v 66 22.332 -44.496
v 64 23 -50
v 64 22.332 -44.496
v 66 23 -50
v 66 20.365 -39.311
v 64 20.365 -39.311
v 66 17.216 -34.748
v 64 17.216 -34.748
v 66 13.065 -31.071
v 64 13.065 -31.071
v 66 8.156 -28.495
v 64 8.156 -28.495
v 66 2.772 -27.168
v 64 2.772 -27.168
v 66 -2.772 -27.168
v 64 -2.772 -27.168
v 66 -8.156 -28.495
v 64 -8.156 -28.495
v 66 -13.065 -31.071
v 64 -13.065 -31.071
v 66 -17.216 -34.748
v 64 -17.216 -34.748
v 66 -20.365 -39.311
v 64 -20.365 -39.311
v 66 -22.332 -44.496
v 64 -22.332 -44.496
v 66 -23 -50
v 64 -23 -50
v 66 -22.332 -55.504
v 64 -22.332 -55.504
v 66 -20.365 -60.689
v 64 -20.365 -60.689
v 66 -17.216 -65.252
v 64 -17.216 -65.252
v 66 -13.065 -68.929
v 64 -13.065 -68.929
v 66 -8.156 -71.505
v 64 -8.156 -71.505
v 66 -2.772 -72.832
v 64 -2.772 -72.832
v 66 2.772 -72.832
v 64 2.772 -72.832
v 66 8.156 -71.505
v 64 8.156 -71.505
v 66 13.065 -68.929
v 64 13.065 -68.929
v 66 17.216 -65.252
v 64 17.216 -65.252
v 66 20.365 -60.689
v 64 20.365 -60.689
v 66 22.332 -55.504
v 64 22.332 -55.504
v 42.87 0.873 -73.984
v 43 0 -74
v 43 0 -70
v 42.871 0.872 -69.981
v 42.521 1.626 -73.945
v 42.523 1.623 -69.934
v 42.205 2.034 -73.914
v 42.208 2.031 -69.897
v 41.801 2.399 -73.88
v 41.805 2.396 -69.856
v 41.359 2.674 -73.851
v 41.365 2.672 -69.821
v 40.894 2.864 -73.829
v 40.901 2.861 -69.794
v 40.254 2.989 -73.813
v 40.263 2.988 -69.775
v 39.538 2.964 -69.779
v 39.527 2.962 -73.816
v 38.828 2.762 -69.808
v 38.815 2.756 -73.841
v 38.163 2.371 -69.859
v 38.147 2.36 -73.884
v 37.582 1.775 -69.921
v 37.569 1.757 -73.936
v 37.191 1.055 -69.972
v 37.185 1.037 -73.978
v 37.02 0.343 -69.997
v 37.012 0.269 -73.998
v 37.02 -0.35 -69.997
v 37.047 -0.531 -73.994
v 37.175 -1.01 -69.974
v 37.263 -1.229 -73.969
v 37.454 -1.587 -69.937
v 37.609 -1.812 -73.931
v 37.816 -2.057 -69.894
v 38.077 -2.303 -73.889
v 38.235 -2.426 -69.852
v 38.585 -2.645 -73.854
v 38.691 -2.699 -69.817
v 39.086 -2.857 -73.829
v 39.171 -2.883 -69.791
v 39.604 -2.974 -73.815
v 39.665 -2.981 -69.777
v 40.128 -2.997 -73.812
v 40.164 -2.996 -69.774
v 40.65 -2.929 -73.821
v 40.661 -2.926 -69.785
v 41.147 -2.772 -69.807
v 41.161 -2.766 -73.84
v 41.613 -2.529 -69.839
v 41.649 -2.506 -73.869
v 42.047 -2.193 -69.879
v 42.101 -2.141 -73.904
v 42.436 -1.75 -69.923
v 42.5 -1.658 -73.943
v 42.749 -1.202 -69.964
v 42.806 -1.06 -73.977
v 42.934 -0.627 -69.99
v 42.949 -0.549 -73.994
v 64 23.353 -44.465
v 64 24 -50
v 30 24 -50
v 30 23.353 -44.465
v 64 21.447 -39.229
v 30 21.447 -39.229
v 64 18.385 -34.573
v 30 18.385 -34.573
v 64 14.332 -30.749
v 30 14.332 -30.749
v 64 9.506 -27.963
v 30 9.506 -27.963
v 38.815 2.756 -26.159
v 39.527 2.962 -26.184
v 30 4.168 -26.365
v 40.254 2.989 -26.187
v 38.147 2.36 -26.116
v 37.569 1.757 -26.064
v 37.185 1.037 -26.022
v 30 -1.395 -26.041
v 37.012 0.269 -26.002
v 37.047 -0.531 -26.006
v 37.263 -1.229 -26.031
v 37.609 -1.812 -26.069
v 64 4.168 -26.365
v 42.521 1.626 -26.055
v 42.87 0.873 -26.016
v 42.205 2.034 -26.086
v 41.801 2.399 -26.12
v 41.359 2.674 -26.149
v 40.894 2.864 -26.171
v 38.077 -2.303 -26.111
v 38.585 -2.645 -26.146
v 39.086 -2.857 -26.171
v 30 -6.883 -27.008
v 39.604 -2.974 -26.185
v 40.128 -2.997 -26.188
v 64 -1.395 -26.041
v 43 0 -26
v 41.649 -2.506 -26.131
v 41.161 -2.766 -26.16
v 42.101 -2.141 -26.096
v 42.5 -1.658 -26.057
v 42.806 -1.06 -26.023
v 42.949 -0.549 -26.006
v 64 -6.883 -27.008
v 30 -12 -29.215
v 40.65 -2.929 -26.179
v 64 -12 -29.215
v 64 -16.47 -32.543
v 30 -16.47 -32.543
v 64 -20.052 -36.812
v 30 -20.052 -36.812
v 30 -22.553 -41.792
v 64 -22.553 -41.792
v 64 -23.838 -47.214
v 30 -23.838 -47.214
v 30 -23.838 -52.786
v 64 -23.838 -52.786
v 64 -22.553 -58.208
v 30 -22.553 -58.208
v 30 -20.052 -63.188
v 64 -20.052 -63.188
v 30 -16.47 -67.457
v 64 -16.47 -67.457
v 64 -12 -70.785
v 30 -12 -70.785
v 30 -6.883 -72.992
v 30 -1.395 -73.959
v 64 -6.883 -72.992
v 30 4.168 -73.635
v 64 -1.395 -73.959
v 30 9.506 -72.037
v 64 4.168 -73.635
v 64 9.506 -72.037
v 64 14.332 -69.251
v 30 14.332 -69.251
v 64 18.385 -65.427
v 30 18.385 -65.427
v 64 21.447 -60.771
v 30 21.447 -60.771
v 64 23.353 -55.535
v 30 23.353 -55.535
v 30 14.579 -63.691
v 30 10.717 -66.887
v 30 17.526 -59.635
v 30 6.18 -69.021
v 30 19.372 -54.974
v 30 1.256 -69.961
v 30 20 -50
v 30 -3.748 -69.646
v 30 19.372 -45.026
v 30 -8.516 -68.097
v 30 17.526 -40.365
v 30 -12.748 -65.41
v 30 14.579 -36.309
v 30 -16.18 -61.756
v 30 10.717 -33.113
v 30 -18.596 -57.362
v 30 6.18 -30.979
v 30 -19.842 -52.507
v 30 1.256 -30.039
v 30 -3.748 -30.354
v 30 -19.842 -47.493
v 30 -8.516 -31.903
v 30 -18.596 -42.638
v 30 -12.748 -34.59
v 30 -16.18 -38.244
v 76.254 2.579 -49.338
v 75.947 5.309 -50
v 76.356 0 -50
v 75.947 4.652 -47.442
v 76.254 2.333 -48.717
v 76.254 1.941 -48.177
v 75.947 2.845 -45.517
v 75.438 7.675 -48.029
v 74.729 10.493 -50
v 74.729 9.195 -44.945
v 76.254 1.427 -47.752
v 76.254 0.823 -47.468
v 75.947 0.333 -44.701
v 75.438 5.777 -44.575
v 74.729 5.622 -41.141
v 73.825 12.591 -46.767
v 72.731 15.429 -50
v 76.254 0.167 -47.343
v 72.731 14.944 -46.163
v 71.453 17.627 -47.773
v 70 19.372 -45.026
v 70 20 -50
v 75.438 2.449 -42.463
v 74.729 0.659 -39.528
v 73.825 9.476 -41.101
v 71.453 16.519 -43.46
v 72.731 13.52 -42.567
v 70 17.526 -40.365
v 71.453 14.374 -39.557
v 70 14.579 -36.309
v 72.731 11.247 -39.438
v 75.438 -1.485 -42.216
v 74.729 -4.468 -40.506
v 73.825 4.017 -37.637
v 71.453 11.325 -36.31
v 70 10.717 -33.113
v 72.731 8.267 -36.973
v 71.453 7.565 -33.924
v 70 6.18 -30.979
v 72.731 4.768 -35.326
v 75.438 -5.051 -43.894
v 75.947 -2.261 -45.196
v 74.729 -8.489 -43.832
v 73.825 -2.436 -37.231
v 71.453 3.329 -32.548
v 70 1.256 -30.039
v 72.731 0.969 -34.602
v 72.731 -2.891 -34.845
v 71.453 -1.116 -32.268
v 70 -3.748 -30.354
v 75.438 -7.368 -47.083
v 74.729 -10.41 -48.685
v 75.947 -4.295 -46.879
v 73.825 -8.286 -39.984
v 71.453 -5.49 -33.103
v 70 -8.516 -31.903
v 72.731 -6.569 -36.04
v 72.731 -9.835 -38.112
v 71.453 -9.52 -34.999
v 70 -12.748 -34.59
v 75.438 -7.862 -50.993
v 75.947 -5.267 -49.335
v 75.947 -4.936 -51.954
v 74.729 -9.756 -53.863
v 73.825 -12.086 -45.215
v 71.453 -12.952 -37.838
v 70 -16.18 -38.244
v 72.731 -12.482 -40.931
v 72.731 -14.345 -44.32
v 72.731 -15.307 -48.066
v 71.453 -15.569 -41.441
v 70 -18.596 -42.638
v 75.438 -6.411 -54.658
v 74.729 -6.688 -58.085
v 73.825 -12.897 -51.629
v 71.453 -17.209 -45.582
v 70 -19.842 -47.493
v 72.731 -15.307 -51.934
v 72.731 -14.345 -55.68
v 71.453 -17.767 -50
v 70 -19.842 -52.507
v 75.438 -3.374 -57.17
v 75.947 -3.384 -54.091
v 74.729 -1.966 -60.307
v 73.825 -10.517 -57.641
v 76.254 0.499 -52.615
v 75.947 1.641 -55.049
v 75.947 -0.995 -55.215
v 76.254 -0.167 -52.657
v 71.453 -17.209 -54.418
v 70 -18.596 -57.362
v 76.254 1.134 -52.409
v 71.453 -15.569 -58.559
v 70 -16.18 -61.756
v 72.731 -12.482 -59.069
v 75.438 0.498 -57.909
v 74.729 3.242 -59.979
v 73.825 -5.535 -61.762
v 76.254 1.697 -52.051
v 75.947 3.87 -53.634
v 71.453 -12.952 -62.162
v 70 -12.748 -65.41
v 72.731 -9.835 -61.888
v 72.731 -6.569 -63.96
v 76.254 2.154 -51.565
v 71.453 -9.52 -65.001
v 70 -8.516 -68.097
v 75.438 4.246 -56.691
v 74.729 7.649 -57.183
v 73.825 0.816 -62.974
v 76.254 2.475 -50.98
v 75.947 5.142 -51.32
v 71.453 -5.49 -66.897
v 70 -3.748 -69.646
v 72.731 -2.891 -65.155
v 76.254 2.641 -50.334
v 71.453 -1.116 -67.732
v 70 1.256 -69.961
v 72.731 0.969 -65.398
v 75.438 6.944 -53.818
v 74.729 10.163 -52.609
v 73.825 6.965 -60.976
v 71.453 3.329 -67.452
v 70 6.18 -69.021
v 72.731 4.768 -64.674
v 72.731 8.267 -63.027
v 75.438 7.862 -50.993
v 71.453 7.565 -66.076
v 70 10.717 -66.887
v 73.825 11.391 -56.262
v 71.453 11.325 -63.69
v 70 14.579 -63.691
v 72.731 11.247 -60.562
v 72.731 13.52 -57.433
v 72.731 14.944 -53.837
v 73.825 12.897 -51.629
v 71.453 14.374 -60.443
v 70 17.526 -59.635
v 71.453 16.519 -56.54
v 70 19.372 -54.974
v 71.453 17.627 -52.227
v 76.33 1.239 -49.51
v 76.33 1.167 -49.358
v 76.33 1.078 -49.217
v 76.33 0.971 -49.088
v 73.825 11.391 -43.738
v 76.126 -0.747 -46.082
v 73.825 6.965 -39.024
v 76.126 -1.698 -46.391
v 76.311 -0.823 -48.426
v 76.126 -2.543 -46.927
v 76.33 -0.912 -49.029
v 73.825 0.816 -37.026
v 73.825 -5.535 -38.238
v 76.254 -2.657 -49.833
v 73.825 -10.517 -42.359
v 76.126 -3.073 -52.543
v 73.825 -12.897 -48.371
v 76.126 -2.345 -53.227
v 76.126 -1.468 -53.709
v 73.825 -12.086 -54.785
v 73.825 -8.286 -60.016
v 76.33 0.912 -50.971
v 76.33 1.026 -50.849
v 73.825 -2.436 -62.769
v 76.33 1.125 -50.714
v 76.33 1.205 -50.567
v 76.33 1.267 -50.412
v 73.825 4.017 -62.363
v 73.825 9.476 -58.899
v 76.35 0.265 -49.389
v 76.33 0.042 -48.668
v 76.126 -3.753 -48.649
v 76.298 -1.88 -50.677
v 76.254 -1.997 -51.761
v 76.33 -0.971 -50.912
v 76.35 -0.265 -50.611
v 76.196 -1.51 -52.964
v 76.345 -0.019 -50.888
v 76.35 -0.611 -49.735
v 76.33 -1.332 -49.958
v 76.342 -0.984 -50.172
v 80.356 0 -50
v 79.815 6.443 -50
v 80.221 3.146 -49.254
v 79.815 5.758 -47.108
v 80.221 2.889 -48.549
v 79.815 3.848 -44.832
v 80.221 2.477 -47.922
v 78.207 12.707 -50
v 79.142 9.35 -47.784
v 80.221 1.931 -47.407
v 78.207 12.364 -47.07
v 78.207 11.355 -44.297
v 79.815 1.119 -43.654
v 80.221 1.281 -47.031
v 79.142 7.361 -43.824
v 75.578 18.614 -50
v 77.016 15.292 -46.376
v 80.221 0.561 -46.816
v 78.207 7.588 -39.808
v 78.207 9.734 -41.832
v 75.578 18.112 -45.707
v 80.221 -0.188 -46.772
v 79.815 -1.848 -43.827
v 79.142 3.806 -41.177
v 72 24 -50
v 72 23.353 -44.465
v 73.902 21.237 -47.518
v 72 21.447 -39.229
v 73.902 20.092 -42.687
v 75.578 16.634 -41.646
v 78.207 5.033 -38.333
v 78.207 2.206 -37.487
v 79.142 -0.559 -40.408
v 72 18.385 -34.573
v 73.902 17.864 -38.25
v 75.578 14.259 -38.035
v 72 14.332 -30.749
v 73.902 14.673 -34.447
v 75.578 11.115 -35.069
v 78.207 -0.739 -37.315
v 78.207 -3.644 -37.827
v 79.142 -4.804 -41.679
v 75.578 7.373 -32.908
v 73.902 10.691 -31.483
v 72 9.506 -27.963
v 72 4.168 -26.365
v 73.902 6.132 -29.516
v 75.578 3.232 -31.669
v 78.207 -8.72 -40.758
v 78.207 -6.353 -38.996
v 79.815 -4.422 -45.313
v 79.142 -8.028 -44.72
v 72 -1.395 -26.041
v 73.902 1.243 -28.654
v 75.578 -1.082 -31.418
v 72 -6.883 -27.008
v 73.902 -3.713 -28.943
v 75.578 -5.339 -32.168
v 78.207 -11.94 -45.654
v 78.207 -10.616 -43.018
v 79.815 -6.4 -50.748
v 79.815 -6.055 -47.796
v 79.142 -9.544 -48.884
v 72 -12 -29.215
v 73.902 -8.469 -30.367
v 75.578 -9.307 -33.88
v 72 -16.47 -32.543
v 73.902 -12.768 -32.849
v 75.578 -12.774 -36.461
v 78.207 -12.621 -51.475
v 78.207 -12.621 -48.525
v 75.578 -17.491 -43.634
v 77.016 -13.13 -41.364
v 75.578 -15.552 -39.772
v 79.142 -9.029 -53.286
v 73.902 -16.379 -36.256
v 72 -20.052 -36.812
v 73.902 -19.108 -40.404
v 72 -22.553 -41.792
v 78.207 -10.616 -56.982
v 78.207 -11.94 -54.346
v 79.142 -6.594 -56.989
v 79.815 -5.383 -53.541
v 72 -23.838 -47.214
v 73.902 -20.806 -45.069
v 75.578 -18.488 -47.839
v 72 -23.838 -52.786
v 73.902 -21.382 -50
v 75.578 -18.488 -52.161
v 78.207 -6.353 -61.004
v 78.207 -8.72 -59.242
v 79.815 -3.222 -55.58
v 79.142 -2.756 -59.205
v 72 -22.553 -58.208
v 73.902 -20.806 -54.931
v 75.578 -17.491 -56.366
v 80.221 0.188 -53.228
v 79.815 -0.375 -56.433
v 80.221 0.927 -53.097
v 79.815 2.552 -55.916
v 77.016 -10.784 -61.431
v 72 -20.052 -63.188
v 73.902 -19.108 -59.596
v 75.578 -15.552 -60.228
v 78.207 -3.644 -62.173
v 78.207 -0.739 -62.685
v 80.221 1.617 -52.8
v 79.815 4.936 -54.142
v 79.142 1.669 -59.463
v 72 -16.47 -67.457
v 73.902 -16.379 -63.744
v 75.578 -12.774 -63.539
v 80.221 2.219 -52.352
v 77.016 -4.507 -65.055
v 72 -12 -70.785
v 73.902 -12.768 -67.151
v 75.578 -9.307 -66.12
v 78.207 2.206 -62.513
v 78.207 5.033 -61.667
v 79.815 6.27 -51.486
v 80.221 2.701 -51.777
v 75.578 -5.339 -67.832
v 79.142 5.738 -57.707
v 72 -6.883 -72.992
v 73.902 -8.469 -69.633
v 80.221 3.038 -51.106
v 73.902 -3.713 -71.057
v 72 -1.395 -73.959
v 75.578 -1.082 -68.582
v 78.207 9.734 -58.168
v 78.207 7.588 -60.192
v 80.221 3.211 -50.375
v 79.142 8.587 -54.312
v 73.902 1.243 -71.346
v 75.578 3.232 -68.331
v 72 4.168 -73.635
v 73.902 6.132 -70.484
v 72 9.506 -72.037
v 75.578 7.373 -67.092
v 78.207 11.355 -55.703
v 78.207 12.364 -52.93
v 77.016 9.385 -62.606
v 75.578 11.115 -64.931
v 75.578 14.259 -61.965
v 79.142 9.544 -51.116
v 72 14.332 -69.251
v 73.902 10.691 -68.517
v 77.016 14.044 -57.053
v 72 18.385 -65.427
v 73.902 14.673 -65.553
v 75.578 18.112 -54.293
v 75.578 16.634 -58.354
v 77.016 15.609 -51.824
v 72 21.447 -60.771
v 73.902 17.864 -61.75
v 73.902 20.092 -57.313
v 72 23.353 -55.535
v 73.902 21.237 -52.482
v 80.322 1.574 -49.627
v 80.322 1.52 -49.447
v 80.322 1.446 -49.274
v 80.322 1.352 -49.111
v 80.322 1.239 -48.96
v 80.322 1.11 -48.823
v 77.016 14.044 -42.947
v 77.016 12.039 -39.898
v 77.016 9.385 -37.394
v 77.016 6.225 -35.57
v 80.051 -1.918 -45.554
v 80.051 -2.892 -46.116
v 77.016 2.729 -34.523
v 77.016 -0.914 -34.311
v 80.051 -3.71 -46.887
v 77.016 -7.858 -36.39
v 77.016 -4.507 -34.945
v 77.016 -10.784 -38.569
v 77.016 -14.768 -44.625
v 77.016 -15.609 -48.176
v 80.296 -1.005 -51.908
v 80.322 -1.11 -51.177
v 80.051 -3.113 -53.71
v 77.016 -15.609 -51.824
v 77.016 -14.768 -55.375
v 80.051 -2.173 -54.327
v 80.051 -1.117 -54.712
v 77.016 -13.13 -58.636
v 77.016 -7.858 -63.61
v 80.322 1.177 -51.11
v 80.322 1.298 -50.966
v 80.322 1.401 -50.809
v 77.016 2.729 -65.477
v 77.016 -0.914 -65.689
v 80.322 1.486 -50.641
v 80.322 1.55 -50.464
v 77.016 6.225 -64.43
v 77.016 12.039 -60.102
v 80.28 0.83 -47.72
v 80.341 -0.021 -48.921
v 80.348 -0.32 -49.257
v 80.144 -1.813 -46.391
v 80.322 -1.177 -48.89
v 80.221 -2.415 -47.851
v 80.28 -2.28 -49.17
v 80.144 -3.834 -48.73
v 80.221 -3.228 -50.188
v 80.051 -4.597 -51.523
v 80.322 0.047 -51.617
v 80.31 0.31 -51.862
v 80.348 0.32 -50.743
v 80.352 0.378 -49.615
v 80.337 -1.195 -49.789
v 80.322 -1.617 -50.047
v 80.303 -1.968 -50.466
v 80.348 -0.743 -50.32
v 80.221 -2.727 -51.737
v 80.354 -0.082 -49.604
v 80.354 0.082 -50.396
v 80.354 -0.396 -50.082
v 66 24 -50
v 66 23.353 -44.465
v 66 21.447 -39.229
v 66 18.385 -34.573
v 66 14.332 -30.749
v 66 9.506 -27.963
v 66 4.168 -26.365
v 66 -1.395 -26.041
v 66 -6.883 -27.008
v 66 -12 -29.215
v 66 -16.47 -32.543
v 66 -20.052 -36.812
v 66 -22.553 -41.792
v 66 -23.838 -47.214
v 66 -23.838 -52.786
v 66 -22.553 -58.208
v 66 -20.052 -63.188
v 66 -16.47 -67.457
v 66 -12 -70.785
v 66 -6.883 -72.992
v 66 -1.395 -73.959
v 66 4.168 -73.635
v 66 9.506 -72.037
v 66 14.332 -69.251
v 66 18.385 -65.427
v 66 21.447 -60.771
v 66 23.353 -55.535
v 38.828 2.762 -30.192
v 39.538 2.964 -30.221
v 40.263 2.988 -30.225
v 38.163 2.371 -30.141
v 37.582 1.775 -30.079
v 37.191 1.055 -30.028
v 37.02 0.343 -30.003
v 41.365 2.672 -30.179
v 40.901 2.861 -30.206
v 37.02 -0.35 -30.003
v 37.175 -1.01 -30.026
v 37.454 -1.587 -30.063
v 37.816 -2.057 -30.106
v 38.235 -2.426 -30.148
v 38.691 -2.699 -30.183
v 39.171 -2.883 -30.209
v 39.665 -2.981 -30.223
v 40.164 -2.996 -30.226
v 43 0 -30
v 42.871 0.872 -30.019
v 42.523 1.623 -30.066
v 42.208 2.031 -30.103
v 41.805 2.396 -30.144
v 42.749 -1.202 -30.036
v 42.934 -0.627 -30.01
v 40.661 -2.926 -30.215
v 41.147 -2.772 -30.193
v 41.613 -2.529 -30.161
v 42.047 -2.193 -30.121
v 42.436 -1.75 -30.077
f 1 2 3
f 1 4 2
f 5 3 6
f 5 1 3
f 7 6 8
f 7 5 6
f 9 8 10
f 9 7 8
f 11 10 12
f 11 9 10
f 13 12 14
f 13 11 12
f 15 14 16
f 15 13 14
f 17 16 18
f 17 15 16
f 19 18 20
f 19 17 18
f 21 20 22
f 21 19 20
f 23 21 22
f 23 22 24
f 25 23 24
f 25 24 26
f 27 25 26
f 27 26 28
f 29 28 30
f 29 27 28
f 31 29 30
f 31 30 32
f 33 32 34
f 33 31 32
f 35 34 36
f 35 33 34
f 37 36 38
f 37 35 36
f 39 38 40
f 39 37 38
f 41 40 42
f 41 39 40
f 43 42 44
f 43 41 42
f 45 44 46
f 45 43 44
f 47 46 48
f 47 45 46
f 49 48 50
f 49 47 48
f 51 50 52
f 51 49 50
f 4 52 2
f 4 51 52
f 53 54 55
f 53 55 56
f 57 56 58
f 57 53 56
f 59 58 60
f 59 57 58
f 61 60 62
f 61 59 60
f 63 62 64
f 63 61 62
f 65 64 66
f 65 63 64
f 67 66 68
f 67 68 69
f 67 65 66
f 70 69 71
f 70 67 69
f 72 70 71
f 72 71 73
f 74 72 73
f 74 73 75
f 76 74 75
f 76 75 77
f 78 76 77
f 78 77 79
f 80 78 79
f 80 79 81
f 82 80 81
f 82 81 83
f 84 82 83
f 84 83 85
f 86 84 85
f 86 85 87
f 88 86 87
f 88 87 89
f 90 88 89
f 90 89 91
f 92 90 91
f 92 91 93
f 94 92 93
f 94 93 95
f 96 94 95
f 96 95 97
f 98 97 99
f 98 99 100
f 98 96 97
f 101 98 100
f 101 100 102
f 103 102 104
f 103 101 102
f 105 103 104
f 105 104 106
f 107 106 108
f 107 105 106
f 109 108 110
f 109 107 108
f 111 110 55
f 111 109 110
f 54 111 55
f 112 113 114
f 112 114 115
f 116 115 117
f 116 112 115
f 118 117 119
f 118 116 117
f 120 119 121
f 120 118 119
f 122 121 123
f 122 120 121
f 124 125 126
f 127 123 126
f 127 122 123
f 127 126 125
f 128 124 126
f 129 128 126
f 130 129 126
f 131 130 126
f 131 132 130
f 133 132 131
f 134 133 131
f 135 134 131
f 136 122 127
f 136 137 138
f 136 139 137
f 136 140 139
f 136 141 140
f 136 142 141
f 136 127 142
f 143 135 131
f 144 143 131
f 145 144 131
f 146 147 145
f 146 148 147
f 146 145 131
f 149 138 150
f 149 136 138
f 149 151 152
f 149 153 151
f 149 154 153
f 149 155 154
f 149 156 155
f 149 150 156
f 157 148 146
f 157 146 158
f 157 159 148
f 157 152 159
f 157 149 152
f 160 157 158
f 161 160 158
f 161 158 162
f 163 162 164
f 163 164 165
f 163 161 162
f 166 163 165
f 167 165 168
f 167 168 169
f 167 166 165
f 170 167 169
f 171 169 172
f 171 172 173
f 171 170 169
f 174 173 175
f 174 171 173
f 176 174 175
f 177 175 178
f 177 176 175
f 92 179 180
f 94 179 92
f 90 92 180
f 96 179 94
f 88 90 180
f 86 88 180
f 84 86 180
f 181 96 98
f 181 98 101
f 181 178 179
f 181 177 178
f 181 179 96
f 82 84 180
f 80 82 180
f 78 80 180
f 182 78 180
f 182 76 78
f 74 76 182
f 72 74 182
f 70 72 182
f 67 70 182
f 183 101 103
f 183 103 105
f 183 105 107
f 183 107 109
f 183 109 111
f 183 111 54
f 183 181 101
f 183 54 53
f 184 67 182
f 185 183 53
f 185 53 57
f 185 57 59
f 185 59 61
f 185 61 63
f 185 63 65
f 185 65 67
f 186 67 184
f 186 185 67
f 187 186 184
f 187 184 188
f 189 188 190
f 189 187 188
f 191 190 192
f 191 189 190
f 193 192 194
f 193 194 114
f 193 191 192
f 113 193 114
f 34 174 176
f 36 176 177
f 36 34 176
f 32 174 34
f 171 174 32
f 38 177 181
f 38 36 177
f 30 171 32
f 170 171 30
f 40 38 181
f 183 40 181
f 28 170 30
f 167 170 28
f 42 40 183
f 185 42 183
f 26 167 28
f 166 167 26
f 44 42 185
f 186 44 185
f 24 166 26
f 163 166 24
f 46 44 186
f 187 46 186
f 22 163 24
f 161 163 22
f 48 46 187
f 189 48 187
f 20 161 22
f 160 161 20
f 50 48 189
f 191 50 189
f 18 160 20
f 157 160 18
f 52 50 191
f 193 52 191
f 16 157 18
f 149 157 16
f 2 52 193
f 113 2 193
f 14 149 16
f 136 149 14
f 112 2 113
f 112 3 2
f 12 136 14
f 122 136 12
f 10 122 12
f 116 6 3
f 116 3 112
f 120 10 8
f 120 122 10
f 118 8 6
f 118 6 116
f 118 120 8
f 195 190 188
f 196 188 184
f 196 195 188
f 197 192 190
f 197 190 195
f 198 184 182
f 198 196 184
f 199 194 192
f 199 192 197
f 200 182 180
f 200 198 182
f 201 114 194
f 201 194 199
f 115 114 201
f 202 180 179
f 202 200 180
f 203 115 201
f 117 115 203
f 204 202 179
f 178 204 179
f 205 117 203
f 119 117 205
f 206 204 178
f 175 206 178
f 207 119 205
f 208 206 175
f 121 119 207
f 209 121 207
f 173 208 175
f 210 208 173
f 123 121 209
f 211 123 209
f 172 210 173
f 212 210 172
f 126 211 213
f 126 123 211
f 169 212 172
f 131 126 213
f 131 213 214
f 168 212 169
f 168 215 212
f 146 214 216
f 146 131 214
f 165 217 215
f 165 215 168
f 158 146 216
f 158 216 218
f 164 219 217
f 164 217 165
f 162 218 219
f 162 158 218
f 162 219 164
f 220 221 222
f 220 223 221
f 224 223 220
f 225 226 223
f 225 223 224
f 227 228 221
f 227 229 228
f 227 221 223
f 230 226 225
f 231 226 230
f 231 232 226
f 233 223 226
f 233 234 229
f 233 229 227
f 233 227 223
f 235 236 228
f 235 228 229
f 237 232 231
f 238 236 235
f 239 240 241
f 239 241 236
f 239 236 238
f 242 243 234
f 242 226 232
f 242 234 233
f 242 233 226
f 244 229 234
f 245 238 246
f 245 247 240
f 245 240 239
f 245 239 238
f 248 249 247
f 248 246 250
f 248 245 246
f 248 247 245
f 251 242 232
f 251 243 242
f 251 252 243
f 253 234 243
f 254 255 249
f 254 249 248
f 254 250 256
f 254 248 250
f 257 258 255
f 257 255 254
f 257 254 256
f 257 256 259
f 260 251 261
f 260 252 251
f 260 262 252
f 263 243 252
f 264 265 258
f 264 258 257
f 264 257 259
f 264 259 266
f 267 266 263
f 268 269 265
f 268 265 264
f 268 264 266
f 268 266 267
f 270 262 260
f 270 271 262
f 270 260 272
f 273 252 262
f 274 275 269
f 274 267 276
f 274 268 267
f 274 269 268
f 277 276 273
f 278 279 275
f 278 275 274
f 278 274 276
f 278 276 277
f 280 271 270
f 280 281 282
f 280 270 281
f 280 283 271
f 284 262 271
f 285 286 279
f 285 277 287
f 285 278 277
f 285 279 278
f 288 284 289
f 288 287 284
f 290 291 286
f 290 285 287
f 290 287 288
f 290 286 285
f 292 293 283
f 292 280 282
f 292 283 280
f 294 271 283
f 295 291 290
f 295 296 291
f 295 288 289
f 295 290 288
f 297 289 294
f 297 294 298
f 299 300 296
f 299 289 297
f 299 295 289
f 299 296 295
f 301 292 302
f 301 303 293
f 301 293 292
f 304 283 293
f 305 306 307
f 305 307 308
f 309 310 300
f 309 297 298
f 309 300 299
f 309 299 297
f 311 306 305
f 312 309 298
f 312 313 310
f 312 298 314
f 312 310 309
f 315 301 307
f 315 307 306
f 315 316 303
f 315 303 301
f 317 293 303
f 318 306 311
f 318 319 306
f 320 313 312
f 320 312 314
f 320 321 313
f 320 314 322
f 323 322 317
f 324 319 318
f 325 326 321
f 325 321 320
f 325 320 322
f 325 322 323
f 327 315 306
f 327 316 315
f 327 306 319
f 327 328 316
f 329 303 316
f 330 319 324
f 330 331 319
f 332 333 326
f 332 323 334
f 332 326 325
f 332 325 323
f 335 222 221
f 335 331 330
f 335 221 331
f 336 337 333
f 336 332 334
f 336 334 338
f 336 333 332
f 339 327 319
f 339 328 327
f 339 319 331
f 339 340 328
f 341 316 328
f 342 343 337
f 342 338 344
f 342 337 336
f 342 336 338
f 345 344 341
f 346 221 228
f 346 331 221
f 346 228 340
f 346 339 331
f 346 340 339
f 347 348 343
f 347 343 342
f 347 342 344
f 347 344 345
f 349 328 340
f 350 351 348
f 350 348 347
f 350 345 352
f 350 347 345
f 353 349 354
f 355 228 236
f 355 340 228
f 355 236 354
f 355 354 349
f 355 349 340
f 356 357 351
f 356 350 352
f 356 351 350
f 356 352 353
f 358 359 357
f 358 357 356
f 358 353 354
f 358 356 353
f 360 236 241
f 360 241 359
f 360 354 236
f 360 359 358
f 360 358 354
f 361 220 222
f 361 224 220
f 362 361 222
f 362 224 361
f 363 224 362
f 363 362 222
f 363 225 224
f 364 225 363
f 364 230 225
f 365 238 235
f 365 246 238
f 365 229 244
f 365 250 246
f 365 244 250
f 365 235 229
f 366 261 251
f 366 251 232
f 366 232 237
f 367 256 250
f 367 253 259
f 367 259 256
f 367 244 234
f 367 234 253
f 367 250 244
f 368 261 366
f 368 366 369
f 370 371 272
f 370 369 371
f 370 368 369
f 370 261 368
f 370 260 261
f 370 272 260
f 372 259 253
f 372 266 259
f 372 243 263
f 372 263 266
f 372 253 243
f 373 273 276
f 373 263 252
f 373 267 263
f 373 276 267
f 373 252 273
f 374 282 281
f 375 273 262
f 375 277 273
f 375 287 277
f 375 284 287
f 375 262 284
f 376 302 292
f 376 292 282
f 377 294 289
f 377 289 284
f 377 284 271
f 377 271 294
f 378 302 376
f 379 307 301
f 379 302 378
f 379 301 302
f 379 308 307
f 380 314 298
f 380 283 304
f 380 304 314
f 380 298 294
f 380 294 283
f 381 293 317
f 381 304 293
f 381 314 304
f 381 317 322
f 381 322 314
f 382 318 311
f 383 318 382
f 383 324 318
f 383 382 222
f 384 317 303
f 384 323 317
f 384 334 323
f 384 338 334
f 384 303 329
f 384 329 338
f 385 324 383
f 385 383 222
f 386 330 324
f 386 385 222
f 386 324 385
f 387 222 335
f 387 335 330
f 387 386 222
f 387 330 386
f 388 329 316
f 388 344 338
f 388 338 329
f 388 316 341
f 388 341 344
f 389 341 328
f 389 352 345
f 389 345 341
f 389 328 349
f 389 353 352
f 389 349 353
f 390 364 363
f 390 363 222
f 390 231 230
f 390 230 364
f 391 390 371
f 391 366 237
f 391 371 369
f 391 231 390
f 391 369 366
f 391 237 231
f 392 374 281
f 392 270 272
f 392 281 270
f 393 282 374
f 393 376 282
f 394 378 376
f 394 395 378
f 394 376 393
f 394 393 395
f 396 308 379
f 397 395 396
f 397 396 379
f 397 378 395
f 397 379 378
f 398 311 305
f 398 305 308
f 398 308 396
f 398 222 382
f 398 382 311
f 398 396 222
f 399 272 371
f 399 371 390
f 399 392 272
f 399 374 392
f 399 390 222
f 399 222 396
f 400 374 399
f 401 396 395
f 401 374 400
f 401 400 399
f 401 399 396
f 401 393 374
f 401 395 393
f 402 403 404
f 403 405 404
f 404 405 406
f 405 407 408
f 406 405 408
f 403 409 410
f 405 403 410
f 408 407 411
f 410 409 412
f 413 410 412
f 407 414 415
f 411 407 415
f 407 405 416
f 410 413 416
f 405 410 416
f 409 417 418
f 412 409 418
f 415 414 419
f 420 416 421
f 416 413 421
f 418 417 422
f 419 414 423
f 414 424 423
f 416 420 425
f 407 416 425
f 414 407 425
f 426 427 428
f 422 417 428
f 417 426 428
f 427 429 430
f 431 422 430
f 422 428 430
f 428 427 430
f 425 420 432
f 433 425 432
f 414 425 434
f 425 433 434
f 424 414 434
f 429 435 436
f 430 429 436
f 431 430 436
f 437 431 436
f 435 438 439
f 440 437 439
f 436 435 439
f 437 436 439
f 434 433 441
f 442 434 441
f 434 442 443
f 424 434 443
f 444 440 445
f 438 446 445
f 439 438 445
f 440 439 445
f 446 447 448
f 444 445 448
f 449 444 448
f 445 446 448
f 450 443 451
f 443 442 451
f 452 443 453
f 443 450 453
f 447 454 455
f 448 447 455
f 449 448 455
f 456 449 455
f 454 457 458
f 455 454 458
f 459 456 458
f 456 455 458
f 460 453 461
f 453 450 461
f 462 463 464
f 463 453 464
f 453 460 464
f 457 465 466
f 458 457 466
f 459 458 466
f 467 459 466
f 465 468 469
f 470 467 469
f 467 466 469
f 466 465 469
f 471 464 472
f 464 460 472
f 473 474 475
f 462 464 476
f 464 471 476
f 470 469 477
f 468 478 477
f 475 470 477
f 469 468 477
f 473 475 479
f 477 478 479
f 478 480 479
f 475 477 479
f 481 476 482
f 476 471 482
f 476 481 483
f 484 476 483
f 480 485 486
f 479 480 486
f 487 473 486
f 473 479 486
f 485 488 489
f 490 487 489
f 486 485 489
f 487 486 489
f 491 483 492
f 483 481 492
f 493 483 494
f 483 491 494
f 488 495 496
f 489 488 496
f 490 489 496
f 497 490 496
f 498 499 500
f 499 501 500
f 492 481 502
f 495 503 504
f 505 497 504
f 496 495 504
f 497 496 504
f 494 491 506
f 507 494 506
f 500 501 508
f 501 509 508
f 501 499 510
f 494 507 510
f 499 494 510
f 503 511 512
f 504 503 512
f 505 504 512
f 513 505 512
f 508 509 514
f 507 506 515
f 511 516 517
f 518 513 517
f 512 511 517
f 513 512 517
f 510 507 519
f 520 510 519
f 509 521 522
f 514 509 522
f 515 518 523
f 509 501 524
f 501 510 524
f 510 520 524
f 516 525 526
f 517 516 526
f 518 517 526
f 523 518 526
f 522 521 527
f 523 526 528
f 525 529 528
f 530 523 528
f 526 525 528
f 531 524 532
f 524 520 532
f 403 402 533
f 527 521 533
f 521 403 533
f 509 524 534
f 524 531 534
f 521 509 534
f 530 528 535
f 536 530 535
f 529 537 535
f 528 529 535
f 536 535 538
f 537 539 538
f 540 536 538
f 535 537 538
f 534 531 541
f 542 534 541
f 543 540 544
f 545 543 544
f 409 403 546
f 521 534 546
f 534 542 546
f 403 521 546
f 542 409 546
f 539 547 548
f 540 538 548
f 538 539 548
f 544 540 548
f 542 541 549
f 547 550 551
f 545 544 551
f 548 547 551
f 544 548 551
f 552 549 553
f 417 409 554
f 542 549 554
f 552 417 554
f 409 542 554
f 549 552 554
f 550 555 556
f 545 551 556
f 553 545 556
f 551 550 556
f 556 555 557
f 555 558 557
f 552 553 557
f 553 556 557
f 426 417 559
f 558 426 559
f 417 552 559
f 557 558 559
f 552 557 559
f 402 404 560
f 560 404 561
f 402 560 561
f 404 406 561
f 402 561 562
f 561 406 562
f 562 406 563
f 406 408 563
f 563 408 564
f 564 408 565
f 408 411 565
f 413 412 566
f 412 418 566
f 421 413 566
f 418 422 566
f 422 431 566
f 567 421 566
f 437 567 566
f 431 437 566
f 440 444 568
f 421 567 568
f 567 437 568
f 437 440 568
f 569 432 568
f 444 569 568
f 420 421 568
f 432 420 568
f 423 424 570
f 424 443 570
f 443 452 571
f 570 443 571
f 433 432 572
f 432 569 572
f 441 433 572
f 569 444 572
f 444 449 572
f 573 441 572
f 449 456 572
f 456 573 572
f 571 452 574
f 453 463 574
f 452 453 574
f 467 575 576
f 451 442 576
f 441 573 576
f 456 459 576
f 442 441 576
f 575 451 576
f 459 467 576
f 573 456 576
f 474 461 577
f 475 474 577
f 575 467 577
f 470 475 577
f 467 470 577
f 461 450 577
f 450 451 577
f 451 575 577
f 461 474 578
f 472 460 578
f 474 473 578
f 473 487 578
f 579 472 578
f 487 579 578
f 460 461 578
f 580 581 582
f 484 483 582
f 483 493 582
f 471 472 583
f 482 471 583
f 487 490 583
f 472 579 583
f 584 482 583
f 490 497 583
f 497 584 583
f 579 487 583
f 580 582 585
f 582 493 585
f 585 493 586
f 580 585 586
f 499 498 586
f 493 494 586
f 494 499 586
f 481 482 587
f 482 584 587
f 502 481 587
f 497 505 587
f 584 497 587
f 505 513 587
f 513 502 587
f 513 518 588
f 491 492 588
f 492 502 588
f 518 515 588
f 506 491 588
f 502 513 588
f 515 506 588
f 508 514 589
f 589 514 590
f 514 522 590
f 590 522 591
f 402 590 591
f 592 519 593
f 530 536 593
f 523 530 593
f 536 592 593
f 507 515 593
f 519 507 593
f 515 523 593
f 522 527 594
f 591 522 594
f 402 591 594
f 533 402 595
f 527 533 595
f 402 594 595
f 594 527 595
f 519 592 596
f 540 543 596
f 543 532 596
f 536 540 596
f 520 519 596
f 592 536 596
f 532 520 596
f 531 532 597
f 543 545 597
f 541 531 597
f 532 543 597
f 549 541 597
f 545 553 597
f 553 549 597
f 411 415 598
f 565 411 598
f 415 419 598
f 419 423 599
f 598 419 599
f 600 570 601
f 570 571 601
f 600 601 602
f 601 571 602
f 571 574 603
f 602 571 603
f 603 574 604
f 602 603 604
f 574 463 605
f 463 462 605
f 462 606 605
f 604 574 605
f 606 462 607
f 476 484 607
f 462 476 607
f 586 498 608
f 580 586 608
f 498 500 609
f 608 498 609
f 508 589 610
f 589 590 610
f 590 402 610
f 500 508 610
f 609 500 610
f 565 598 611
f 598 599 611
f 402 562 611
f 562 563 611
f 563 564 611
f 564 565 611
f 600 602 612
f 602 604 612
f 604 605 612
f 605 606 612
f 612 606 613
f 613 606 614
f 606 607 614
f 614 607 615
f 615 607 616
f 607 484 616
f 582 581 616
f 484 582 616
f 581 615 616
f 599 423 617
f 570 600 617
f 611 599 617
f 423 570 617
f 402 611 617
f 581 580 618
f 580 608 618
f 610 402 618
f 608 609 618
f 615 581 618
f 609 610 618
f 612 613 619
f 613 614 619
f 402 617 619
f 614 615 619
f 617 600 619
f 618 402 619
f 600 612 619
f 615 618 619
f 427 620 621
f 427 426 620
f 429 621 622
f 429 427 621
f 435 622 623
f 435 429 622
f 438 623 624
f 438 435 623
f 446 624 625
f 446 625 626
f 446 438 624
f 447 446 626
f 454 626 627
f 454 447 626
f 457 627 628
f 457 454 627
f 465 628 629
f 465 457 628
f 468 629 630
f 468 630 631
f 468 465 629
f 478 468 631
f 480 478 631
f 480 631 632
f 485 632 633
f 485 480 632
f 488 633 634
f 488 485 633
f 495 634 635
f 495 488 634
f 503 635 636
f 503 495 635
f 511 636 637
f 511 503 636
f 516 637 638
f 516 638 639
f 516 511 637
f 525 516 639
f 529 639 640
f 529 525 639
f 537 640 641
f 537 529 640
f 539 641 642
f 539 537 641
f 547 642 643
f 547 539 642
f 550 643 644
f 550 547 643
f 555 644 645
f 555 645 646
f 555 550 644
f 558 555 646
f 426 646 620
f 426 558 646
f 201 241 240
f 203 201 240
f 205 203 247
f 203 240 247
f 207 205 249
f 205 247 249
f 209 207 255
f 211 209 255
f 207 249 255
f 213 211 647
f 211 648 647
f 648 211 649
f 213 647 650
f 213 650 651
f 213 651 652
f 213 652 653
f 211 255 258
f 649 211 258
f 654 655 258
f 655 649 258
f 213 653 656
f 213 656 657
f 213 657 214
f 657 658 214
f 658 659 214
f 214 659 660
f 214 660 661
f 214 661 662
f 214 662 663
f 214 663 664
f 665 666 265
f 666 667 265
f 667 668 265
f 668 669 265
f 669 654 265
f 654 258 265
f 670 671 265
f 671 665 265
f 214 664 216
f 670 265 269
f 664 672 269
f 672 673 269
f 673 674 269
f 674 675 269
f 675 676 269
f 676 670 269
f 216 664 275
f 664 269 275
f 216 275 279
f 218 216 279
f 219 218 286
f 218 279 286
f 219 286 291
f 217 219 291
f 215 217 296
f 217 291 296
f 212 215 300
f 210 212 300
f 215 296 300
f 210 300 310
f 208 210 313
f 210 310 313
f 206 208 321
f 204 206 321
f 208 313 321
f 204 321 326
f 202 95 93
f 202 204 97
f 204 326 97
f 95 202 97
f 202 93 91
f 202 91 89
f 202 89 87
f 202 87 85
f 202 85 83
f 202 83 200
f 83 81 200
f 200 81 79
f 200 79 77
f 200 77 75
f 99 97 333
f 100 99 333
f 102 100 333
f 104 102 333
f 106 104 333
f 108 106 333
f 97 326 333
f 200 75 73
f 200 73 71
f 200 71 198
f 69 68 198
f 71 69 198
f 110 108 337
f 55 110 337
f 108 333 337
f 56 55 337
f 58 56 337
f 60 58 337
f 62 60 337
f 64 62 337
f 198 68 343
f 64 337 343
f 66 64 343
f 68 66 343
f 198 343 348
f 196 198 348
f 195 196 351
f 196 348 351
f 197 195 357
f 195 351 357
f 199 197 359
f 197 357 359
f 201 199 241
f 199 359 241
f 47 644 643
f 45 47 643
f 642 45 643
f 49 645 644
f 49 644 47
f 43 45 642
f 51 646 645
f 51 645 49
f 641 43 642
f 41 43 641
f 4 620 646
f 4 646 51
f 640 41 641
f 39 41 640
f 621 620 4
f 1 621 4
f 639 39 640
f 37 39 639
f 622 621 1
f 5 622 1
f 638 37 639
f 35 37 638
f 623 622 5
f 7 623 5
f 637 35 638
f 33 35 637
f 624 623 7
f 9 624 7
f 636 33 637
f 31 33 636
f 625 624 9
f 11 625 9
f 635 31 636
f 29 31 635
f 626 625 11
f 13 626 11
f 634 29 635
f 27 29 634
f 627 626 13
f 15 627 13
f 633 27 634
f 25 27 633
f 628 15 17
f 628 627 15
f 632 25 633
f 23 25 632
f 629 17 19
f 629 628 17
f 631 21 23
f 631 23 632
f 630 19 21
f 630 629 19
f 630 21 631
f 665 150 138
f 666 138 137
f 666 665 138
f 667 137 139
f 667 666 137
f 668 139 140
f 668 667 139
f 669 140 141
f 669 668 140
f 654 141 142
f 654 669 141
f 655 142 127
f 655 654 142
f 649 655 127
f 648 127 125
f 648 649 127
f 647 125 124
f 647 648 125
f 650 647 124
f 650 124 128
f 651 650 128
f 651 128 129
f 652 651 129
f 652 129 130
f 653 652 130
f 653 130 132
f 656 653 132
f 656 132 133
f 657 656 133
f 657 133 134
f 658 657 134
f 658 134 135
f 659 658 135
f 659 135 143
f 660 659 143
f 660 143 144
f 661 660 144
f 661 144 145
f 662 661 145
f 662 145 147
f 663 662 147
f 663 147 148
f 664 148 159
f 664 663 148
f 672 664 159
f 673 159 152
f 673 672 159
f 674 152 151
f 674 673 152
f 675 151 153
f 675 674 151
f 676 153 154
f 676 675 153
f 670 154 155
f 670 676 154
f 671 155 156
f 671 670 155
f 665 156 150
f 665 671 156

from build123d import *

# Parameters (mm, degrees)
CYLINDER_R     = 3
CYLINDER_DEPTH = 49


with BuildPart() as cylinder:
    # Cylinder → Cylinder (new body)
    with BuildSketch(Plane(origin=(40, 0, -75), x_dir=(1, 0, 0), z_dir=(0, 0, 1))):
        Circle(CYLINDER_R)
    extrude(amount=CYLINDER_DEPTH)


with BuildPart() as piston_hole:
    # Sketch010 → Revolution (revolve)
    with BuildSketch(Plane.XY.offset(-50)):
        with BuildLine():
            Line((30, 20), (70, 20))
            ThreePointArc((76.356083, 0), (74.728852, 10.492854), (70, 20))
            Line((80.356083, 0), (76.356083, 0))
            ThreePointArc((80.356083, 0), (78.207329, 12.706537), (72, 24))
            Line((66, 24), (72, 24))
            Line((66, 23), (66, 24))
            Line((64, 23), (66, 23))
            Line((64, 24), (64, 23))
            Line((30, 24), (64, 24))
            Line((30, 20), (30, 24))
        make_face()
    revolve(axis=Axis((0, 0, -50), (1, 0, 0)))

    # Cut: cut Cylinder
    add(cylinder.part, mode=Mode.SUBTRACT)


solid = piston_hole.part
